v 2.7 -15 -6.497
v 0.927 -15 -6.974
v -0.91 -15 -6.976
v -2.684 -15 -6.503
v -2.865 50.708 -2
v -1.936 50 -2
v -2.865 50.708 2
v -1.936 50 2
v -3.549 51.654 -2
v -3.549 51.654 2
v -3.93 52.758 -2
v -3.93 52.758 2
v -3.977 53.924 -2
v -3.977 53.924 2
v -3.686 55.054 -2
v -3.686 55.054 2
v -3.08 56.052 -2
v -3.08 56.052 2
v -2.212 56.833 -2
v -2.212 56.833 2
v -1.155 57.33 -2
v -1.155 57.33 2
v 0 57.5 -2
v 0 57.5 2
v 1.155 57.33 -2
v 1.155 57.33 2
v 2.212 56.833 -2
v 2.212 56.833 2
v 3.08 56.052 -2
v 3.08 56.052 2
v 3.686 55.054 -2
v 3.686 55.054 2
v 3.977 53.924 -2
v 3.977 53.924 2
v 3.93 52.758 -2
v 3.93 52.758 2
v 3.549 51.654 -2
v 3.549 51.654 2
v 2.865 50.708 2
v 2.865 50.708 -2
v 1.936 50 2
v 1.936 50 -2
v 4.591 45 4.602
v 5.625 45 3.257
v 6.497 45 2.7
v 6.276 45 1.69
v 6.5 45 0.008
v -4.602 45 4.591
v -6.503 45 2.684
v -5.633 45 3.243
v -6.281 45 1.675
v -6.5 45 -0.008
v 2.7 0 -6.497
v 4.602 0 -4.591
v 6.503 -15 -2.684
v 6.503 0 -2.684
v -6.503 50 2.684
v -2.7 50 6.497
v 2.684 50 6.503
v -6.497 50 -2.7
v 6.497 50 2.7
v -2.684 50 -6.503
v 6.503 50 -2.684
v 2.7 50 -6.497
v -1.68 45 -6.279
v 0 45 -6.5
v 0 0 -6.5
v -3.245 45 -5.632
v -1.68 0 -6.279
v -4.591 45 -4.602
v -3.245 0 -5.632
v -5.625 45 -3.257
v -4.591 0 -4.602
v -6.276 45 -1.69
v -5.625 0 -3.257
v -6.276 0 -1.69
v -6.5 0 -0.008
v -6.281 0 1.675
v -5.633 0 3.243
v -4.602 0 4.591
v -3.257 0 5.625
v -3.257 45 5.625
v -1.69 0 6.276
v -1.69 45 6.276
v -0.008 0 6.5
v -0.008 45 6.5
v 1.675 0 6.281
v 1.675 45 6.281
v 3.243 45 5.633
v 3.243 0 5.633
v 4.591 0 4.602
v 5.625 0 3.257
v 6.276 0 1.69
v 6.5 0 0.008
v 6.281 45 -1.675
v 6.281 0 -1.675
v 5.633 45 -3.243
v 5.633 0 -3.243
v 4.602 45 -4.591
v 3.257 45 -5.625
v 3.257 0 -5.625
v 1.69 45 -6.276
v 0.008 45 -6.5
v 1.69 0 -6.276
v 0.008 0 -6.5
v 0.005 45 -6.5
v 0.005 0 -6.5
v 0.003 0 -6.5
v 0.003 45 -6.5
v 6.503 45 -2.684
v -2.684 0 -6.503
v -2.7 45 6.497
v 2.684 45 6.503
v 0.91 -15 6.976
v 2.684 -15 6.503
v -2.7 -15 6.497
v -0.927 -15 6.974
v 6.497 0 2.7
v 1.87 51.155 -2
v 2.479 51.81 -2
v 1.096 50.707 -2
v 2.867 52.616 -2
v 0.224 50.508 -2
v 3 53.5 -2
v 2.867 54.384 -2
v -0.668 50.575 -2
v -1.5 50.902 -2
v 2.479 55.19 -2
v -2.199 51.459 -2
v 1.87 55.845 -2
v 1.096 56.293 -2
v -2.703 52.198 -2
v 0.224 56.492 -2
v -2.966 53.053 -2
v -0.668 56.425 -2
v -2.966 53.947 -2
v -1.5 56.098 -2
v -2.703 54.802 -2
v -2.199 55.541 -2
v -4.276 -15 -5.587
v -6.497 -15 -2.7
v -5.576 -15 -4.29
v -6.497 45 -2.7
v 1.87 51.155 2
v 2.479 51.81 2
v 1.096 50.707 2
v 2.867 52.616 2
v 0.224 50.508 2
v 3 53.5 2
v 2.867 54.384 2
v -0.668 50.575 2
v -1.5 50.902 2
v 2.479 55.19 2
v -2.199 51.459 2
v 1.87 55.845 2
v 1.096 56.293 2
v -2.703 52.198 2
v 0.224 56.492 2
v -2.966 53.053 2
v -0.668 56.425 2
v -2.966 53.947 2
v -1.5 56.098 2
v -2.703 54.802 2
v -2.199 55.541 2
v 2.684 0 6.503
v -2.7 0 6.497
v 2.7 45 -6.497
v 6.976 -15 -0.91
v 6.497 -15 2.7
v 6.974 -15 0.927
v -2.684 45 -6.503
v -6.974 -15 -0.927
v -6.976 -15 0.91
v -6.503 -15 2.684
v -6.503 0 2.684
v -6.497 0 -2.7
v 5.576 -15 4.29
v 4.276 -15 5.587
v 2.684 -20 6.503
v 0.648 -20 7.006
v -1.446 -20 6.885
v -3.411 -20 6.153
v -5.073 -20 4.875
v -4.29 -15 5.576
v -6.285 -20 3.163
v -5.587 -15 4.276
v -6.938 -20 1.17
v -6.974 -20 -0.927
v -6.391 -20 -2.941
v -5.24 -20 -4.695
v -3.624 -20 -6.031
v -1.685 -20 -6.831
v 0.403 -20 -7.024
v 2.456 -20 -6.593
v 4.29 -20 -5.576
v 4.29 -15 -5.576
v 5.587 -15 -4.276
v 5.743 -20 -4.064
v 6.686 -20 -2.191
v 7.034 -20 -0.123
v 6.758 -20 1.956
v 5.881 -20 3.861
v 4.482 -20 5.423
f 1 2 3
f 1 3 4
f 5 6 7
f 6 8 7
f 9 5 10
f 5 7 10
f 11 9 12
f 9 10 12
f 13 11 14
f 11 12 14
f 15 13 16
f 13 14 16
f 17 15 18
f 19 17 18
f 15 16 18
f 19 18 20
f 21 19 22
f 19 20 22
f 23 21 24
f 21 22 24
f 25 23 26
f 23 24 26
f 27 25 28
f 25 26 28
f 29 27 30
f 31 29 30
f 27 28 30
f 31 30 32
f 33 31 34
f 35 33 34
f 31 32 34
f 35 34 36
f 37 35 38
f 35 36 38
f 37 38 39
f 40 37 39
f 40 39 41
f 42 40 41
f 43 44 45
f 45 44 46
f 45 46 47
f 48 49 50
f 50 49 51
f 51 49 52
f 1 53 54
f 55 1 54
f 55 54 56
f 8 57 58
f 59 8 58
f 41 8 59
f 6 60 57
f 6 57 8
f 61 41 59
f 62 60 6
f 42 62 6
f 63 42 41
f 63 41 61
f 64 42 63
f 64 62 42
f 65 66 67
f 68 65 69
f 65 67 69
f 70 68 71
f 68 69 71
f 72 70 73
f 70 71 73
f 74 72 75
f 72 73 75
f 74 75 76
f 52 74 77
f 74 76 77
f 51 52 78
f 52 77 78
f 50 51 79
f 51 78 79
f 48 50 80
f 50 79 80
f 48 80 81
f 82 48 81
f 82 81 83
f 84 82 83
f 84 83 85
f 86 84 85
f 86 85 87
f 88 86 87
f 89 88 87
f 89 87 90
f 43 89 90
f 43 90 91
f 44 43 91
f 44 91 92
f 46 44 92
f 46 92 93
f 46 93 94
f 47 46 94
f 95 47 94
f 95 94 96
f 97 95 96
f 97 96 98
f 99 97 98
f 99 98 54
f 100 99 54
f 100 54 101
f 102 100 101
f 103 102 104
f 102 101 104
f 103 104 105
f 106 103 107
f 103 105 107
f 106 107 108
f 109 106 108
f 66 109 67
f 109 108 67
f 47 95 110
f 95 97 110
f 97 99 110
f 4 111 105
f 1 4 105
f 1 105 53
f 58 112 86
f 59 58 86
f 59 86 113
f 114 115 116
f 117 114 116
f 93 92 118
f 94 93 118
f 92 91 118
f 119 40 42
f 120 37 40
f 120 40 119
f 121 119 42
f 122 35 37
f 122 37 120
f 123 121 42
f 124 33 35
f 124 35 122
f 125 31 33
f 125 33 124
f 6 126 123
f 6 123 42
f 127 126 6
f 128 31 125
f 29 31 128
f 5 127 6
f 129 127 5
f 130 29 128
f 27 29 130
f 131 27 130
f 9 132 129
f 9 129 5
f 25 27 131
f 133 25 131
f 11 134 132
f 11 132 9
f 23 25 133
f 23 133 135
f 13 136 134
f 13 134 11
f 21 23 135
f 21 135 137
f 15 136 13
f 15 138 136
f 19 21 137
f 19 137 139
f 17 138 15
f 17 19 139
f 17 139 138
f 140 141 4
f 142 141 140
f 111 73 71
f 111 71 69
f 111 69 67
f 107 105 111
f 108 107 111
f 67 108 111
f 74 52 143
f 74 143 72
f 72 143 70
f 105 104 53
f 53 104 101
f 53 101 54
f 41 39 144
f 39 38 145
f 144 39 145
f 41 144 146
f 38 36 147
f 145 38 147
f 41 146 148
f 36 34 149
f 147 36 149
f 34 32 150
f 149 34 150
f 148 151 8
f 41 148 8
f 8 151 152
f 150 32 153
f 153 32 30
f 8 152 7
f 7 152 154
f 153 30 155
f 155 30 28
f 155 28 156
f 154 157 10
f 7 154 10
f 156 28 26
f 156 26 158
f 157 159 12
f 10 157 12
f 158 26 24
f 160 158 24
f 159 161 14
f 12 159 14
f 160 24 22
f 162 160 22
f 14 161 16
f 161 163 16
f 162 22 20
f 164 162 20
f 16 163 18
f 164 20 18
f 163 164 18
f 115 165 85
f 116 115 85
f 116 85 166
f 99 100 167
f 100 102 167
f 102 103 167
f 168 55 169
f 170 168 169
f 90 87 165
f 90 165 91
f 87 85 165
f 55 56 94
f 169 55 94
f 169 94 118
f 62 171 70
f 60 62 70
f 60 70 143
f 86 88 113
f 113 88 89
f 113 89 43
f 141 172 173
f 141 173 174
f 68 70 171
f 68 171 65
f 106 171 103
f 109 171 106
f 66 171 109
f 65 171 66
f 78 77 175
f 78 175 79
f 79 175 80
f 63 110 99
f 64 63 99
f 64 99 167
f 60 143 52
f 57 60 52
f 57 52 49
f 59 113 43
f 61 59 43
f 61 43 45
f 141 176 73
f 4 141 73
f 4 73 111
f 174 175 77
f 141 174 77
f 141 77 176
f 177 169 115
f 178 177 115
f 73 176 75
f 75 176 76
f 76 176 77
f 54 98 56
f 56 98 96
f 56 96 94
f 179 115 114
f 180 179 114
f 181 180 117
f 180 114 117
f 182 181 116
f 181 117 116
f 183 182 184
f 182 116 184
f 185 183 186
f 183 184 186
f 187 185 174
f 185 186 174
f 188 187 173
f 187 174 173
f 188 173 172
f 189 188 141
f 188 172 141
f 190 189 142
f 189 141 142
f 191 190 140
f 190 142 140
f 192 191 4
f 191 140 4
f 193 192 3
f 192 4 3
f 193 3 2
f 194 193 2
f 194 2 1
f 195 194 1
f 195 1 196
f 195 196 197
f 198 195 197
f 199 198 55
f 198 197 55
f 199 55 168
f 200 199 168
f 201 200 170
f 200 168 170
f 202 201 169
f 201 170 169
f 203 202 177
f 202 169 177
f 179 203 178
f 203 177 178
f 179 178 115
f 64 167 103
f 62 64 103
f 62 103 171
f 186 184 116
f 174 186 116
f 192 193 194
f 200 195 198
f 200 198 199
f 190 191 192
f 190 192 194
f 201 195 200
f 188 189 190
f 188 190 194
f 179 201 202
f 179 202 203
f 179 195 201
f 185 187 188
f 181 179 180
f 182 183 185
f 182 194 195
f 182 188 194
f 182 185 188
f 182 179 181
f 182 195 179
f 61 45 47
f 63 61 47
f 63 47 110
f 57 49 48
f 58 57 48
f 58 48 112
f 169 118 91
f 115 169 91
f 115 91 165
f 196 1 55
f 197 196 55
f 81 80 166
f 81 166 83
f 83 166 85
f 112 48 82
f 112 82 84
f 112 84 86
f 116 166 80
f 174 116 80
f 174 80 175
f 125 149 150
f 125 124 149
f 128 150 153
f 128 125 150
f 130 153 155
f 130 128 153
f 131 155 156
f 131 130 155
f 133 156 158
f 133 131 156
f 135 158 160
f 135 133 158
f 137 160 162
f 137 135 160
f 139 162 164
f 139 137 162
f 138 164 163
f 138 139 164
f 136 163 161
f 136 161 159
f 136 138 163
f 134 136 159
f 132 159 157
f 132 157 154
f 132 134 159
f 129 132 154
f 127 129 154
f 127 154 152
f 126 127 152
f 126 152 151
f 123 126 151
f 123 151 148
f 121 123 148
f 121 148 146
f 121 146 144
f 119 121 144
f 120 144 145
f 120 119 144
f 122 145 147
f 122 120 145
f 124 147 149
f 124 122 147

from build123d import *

# Parameters (mm, degrees)
SKETCH1_R           = 6.5
BOSS_EXTRUDE1_DEPTH = 45
BOSS_EXTRUDE2_DEPTH = 5
BOSS_EXTRUDE3_DEPTH = 15
SKETCH4_R           = 7.035549302
BOSS_EXTRUDE4_DEPTH = 5
SKETCH5_R           = 3
BOSS_EXTRUDE5_DEPTH = 2


with BuildPart() as part:
    # Sketch1 → Boss-Extrude1 (new body)
    with BuildSketch(Plane(origin=(0, 0, 0), x_dir=(1, 0, 0), z_dir=(0, 1, 0))):
        with Locations(Location((0, 0, 0), (0, 0, 90))):
            Circle(SKETCH1_R)
    extrude(amount=BOSS_EXTRUDE1_DEPTH)

    # Sketch2 → Boss-Extrude2 (add)
    with BuildSketch(Plane(origin=(0, 45, 0), x_dir=(1, 0, 0), z_dir=(0, 1, 0))):
        Polygon((-6.503321941, -2.684354246), (-2.700417954, -6.496668135), (2.684354246, -6.503321941), (6.496668135, -2.700417954), (6.503321941, 2.684354246), (2.700417954, 6.496668135), (-2.684354246, 6.503321941), (-6.496668135, 2.700417954), align=None)
    extrude(amount=BOSS_EXTRUDE2_DEPTH)

    # Sketch3 → Boss-Extrude3 (add)
    with BuildSketch(Plane.XZ):
        Polygon((-2.700417954, 6.496668135), (-6.503321941, 2.684354246), (-6.496668135, -2.700417954), (-2.684354246, -6.503321941), (2.700417954, -6.496668135), (6.503321941, -2.684354246), (6.496668135, 2.700417954), (2.684354246, 6.503321941), align=None)
    extrude(amount=BOSS_EXTRUDE3_DEPTH)

    # Sketch4 → Boss-Extrude4 (add)
    with BuildSketch(Plane.XZ.offset(15)):
        with Locations(Location((0, 0, 0), (0, 0, 67.570798689))):
            Circle(SKETCH4_R)
    extrude(amount=BOSS_EXTRUDE4_DEPTH)

    # Sketch5 → Boss-Extrude5 (add, symmetric)
    with BuildSketch(Plane.XY):
        with BuildLine():
            Line((1.936491673, 50), (-1.936491673, 50))
            ThreePointArc((-1.936491673, 50), (0, 57.5), (1.936491673, 50))
        make_face()
        with Locations((0, 53.5)):
            Circle(SKETCH5_R, mode=Mode.SUBTRACT)
    extrude(amount=BOSS_EXTRUDE5_DEPTH, both=True)


solid = part.part
